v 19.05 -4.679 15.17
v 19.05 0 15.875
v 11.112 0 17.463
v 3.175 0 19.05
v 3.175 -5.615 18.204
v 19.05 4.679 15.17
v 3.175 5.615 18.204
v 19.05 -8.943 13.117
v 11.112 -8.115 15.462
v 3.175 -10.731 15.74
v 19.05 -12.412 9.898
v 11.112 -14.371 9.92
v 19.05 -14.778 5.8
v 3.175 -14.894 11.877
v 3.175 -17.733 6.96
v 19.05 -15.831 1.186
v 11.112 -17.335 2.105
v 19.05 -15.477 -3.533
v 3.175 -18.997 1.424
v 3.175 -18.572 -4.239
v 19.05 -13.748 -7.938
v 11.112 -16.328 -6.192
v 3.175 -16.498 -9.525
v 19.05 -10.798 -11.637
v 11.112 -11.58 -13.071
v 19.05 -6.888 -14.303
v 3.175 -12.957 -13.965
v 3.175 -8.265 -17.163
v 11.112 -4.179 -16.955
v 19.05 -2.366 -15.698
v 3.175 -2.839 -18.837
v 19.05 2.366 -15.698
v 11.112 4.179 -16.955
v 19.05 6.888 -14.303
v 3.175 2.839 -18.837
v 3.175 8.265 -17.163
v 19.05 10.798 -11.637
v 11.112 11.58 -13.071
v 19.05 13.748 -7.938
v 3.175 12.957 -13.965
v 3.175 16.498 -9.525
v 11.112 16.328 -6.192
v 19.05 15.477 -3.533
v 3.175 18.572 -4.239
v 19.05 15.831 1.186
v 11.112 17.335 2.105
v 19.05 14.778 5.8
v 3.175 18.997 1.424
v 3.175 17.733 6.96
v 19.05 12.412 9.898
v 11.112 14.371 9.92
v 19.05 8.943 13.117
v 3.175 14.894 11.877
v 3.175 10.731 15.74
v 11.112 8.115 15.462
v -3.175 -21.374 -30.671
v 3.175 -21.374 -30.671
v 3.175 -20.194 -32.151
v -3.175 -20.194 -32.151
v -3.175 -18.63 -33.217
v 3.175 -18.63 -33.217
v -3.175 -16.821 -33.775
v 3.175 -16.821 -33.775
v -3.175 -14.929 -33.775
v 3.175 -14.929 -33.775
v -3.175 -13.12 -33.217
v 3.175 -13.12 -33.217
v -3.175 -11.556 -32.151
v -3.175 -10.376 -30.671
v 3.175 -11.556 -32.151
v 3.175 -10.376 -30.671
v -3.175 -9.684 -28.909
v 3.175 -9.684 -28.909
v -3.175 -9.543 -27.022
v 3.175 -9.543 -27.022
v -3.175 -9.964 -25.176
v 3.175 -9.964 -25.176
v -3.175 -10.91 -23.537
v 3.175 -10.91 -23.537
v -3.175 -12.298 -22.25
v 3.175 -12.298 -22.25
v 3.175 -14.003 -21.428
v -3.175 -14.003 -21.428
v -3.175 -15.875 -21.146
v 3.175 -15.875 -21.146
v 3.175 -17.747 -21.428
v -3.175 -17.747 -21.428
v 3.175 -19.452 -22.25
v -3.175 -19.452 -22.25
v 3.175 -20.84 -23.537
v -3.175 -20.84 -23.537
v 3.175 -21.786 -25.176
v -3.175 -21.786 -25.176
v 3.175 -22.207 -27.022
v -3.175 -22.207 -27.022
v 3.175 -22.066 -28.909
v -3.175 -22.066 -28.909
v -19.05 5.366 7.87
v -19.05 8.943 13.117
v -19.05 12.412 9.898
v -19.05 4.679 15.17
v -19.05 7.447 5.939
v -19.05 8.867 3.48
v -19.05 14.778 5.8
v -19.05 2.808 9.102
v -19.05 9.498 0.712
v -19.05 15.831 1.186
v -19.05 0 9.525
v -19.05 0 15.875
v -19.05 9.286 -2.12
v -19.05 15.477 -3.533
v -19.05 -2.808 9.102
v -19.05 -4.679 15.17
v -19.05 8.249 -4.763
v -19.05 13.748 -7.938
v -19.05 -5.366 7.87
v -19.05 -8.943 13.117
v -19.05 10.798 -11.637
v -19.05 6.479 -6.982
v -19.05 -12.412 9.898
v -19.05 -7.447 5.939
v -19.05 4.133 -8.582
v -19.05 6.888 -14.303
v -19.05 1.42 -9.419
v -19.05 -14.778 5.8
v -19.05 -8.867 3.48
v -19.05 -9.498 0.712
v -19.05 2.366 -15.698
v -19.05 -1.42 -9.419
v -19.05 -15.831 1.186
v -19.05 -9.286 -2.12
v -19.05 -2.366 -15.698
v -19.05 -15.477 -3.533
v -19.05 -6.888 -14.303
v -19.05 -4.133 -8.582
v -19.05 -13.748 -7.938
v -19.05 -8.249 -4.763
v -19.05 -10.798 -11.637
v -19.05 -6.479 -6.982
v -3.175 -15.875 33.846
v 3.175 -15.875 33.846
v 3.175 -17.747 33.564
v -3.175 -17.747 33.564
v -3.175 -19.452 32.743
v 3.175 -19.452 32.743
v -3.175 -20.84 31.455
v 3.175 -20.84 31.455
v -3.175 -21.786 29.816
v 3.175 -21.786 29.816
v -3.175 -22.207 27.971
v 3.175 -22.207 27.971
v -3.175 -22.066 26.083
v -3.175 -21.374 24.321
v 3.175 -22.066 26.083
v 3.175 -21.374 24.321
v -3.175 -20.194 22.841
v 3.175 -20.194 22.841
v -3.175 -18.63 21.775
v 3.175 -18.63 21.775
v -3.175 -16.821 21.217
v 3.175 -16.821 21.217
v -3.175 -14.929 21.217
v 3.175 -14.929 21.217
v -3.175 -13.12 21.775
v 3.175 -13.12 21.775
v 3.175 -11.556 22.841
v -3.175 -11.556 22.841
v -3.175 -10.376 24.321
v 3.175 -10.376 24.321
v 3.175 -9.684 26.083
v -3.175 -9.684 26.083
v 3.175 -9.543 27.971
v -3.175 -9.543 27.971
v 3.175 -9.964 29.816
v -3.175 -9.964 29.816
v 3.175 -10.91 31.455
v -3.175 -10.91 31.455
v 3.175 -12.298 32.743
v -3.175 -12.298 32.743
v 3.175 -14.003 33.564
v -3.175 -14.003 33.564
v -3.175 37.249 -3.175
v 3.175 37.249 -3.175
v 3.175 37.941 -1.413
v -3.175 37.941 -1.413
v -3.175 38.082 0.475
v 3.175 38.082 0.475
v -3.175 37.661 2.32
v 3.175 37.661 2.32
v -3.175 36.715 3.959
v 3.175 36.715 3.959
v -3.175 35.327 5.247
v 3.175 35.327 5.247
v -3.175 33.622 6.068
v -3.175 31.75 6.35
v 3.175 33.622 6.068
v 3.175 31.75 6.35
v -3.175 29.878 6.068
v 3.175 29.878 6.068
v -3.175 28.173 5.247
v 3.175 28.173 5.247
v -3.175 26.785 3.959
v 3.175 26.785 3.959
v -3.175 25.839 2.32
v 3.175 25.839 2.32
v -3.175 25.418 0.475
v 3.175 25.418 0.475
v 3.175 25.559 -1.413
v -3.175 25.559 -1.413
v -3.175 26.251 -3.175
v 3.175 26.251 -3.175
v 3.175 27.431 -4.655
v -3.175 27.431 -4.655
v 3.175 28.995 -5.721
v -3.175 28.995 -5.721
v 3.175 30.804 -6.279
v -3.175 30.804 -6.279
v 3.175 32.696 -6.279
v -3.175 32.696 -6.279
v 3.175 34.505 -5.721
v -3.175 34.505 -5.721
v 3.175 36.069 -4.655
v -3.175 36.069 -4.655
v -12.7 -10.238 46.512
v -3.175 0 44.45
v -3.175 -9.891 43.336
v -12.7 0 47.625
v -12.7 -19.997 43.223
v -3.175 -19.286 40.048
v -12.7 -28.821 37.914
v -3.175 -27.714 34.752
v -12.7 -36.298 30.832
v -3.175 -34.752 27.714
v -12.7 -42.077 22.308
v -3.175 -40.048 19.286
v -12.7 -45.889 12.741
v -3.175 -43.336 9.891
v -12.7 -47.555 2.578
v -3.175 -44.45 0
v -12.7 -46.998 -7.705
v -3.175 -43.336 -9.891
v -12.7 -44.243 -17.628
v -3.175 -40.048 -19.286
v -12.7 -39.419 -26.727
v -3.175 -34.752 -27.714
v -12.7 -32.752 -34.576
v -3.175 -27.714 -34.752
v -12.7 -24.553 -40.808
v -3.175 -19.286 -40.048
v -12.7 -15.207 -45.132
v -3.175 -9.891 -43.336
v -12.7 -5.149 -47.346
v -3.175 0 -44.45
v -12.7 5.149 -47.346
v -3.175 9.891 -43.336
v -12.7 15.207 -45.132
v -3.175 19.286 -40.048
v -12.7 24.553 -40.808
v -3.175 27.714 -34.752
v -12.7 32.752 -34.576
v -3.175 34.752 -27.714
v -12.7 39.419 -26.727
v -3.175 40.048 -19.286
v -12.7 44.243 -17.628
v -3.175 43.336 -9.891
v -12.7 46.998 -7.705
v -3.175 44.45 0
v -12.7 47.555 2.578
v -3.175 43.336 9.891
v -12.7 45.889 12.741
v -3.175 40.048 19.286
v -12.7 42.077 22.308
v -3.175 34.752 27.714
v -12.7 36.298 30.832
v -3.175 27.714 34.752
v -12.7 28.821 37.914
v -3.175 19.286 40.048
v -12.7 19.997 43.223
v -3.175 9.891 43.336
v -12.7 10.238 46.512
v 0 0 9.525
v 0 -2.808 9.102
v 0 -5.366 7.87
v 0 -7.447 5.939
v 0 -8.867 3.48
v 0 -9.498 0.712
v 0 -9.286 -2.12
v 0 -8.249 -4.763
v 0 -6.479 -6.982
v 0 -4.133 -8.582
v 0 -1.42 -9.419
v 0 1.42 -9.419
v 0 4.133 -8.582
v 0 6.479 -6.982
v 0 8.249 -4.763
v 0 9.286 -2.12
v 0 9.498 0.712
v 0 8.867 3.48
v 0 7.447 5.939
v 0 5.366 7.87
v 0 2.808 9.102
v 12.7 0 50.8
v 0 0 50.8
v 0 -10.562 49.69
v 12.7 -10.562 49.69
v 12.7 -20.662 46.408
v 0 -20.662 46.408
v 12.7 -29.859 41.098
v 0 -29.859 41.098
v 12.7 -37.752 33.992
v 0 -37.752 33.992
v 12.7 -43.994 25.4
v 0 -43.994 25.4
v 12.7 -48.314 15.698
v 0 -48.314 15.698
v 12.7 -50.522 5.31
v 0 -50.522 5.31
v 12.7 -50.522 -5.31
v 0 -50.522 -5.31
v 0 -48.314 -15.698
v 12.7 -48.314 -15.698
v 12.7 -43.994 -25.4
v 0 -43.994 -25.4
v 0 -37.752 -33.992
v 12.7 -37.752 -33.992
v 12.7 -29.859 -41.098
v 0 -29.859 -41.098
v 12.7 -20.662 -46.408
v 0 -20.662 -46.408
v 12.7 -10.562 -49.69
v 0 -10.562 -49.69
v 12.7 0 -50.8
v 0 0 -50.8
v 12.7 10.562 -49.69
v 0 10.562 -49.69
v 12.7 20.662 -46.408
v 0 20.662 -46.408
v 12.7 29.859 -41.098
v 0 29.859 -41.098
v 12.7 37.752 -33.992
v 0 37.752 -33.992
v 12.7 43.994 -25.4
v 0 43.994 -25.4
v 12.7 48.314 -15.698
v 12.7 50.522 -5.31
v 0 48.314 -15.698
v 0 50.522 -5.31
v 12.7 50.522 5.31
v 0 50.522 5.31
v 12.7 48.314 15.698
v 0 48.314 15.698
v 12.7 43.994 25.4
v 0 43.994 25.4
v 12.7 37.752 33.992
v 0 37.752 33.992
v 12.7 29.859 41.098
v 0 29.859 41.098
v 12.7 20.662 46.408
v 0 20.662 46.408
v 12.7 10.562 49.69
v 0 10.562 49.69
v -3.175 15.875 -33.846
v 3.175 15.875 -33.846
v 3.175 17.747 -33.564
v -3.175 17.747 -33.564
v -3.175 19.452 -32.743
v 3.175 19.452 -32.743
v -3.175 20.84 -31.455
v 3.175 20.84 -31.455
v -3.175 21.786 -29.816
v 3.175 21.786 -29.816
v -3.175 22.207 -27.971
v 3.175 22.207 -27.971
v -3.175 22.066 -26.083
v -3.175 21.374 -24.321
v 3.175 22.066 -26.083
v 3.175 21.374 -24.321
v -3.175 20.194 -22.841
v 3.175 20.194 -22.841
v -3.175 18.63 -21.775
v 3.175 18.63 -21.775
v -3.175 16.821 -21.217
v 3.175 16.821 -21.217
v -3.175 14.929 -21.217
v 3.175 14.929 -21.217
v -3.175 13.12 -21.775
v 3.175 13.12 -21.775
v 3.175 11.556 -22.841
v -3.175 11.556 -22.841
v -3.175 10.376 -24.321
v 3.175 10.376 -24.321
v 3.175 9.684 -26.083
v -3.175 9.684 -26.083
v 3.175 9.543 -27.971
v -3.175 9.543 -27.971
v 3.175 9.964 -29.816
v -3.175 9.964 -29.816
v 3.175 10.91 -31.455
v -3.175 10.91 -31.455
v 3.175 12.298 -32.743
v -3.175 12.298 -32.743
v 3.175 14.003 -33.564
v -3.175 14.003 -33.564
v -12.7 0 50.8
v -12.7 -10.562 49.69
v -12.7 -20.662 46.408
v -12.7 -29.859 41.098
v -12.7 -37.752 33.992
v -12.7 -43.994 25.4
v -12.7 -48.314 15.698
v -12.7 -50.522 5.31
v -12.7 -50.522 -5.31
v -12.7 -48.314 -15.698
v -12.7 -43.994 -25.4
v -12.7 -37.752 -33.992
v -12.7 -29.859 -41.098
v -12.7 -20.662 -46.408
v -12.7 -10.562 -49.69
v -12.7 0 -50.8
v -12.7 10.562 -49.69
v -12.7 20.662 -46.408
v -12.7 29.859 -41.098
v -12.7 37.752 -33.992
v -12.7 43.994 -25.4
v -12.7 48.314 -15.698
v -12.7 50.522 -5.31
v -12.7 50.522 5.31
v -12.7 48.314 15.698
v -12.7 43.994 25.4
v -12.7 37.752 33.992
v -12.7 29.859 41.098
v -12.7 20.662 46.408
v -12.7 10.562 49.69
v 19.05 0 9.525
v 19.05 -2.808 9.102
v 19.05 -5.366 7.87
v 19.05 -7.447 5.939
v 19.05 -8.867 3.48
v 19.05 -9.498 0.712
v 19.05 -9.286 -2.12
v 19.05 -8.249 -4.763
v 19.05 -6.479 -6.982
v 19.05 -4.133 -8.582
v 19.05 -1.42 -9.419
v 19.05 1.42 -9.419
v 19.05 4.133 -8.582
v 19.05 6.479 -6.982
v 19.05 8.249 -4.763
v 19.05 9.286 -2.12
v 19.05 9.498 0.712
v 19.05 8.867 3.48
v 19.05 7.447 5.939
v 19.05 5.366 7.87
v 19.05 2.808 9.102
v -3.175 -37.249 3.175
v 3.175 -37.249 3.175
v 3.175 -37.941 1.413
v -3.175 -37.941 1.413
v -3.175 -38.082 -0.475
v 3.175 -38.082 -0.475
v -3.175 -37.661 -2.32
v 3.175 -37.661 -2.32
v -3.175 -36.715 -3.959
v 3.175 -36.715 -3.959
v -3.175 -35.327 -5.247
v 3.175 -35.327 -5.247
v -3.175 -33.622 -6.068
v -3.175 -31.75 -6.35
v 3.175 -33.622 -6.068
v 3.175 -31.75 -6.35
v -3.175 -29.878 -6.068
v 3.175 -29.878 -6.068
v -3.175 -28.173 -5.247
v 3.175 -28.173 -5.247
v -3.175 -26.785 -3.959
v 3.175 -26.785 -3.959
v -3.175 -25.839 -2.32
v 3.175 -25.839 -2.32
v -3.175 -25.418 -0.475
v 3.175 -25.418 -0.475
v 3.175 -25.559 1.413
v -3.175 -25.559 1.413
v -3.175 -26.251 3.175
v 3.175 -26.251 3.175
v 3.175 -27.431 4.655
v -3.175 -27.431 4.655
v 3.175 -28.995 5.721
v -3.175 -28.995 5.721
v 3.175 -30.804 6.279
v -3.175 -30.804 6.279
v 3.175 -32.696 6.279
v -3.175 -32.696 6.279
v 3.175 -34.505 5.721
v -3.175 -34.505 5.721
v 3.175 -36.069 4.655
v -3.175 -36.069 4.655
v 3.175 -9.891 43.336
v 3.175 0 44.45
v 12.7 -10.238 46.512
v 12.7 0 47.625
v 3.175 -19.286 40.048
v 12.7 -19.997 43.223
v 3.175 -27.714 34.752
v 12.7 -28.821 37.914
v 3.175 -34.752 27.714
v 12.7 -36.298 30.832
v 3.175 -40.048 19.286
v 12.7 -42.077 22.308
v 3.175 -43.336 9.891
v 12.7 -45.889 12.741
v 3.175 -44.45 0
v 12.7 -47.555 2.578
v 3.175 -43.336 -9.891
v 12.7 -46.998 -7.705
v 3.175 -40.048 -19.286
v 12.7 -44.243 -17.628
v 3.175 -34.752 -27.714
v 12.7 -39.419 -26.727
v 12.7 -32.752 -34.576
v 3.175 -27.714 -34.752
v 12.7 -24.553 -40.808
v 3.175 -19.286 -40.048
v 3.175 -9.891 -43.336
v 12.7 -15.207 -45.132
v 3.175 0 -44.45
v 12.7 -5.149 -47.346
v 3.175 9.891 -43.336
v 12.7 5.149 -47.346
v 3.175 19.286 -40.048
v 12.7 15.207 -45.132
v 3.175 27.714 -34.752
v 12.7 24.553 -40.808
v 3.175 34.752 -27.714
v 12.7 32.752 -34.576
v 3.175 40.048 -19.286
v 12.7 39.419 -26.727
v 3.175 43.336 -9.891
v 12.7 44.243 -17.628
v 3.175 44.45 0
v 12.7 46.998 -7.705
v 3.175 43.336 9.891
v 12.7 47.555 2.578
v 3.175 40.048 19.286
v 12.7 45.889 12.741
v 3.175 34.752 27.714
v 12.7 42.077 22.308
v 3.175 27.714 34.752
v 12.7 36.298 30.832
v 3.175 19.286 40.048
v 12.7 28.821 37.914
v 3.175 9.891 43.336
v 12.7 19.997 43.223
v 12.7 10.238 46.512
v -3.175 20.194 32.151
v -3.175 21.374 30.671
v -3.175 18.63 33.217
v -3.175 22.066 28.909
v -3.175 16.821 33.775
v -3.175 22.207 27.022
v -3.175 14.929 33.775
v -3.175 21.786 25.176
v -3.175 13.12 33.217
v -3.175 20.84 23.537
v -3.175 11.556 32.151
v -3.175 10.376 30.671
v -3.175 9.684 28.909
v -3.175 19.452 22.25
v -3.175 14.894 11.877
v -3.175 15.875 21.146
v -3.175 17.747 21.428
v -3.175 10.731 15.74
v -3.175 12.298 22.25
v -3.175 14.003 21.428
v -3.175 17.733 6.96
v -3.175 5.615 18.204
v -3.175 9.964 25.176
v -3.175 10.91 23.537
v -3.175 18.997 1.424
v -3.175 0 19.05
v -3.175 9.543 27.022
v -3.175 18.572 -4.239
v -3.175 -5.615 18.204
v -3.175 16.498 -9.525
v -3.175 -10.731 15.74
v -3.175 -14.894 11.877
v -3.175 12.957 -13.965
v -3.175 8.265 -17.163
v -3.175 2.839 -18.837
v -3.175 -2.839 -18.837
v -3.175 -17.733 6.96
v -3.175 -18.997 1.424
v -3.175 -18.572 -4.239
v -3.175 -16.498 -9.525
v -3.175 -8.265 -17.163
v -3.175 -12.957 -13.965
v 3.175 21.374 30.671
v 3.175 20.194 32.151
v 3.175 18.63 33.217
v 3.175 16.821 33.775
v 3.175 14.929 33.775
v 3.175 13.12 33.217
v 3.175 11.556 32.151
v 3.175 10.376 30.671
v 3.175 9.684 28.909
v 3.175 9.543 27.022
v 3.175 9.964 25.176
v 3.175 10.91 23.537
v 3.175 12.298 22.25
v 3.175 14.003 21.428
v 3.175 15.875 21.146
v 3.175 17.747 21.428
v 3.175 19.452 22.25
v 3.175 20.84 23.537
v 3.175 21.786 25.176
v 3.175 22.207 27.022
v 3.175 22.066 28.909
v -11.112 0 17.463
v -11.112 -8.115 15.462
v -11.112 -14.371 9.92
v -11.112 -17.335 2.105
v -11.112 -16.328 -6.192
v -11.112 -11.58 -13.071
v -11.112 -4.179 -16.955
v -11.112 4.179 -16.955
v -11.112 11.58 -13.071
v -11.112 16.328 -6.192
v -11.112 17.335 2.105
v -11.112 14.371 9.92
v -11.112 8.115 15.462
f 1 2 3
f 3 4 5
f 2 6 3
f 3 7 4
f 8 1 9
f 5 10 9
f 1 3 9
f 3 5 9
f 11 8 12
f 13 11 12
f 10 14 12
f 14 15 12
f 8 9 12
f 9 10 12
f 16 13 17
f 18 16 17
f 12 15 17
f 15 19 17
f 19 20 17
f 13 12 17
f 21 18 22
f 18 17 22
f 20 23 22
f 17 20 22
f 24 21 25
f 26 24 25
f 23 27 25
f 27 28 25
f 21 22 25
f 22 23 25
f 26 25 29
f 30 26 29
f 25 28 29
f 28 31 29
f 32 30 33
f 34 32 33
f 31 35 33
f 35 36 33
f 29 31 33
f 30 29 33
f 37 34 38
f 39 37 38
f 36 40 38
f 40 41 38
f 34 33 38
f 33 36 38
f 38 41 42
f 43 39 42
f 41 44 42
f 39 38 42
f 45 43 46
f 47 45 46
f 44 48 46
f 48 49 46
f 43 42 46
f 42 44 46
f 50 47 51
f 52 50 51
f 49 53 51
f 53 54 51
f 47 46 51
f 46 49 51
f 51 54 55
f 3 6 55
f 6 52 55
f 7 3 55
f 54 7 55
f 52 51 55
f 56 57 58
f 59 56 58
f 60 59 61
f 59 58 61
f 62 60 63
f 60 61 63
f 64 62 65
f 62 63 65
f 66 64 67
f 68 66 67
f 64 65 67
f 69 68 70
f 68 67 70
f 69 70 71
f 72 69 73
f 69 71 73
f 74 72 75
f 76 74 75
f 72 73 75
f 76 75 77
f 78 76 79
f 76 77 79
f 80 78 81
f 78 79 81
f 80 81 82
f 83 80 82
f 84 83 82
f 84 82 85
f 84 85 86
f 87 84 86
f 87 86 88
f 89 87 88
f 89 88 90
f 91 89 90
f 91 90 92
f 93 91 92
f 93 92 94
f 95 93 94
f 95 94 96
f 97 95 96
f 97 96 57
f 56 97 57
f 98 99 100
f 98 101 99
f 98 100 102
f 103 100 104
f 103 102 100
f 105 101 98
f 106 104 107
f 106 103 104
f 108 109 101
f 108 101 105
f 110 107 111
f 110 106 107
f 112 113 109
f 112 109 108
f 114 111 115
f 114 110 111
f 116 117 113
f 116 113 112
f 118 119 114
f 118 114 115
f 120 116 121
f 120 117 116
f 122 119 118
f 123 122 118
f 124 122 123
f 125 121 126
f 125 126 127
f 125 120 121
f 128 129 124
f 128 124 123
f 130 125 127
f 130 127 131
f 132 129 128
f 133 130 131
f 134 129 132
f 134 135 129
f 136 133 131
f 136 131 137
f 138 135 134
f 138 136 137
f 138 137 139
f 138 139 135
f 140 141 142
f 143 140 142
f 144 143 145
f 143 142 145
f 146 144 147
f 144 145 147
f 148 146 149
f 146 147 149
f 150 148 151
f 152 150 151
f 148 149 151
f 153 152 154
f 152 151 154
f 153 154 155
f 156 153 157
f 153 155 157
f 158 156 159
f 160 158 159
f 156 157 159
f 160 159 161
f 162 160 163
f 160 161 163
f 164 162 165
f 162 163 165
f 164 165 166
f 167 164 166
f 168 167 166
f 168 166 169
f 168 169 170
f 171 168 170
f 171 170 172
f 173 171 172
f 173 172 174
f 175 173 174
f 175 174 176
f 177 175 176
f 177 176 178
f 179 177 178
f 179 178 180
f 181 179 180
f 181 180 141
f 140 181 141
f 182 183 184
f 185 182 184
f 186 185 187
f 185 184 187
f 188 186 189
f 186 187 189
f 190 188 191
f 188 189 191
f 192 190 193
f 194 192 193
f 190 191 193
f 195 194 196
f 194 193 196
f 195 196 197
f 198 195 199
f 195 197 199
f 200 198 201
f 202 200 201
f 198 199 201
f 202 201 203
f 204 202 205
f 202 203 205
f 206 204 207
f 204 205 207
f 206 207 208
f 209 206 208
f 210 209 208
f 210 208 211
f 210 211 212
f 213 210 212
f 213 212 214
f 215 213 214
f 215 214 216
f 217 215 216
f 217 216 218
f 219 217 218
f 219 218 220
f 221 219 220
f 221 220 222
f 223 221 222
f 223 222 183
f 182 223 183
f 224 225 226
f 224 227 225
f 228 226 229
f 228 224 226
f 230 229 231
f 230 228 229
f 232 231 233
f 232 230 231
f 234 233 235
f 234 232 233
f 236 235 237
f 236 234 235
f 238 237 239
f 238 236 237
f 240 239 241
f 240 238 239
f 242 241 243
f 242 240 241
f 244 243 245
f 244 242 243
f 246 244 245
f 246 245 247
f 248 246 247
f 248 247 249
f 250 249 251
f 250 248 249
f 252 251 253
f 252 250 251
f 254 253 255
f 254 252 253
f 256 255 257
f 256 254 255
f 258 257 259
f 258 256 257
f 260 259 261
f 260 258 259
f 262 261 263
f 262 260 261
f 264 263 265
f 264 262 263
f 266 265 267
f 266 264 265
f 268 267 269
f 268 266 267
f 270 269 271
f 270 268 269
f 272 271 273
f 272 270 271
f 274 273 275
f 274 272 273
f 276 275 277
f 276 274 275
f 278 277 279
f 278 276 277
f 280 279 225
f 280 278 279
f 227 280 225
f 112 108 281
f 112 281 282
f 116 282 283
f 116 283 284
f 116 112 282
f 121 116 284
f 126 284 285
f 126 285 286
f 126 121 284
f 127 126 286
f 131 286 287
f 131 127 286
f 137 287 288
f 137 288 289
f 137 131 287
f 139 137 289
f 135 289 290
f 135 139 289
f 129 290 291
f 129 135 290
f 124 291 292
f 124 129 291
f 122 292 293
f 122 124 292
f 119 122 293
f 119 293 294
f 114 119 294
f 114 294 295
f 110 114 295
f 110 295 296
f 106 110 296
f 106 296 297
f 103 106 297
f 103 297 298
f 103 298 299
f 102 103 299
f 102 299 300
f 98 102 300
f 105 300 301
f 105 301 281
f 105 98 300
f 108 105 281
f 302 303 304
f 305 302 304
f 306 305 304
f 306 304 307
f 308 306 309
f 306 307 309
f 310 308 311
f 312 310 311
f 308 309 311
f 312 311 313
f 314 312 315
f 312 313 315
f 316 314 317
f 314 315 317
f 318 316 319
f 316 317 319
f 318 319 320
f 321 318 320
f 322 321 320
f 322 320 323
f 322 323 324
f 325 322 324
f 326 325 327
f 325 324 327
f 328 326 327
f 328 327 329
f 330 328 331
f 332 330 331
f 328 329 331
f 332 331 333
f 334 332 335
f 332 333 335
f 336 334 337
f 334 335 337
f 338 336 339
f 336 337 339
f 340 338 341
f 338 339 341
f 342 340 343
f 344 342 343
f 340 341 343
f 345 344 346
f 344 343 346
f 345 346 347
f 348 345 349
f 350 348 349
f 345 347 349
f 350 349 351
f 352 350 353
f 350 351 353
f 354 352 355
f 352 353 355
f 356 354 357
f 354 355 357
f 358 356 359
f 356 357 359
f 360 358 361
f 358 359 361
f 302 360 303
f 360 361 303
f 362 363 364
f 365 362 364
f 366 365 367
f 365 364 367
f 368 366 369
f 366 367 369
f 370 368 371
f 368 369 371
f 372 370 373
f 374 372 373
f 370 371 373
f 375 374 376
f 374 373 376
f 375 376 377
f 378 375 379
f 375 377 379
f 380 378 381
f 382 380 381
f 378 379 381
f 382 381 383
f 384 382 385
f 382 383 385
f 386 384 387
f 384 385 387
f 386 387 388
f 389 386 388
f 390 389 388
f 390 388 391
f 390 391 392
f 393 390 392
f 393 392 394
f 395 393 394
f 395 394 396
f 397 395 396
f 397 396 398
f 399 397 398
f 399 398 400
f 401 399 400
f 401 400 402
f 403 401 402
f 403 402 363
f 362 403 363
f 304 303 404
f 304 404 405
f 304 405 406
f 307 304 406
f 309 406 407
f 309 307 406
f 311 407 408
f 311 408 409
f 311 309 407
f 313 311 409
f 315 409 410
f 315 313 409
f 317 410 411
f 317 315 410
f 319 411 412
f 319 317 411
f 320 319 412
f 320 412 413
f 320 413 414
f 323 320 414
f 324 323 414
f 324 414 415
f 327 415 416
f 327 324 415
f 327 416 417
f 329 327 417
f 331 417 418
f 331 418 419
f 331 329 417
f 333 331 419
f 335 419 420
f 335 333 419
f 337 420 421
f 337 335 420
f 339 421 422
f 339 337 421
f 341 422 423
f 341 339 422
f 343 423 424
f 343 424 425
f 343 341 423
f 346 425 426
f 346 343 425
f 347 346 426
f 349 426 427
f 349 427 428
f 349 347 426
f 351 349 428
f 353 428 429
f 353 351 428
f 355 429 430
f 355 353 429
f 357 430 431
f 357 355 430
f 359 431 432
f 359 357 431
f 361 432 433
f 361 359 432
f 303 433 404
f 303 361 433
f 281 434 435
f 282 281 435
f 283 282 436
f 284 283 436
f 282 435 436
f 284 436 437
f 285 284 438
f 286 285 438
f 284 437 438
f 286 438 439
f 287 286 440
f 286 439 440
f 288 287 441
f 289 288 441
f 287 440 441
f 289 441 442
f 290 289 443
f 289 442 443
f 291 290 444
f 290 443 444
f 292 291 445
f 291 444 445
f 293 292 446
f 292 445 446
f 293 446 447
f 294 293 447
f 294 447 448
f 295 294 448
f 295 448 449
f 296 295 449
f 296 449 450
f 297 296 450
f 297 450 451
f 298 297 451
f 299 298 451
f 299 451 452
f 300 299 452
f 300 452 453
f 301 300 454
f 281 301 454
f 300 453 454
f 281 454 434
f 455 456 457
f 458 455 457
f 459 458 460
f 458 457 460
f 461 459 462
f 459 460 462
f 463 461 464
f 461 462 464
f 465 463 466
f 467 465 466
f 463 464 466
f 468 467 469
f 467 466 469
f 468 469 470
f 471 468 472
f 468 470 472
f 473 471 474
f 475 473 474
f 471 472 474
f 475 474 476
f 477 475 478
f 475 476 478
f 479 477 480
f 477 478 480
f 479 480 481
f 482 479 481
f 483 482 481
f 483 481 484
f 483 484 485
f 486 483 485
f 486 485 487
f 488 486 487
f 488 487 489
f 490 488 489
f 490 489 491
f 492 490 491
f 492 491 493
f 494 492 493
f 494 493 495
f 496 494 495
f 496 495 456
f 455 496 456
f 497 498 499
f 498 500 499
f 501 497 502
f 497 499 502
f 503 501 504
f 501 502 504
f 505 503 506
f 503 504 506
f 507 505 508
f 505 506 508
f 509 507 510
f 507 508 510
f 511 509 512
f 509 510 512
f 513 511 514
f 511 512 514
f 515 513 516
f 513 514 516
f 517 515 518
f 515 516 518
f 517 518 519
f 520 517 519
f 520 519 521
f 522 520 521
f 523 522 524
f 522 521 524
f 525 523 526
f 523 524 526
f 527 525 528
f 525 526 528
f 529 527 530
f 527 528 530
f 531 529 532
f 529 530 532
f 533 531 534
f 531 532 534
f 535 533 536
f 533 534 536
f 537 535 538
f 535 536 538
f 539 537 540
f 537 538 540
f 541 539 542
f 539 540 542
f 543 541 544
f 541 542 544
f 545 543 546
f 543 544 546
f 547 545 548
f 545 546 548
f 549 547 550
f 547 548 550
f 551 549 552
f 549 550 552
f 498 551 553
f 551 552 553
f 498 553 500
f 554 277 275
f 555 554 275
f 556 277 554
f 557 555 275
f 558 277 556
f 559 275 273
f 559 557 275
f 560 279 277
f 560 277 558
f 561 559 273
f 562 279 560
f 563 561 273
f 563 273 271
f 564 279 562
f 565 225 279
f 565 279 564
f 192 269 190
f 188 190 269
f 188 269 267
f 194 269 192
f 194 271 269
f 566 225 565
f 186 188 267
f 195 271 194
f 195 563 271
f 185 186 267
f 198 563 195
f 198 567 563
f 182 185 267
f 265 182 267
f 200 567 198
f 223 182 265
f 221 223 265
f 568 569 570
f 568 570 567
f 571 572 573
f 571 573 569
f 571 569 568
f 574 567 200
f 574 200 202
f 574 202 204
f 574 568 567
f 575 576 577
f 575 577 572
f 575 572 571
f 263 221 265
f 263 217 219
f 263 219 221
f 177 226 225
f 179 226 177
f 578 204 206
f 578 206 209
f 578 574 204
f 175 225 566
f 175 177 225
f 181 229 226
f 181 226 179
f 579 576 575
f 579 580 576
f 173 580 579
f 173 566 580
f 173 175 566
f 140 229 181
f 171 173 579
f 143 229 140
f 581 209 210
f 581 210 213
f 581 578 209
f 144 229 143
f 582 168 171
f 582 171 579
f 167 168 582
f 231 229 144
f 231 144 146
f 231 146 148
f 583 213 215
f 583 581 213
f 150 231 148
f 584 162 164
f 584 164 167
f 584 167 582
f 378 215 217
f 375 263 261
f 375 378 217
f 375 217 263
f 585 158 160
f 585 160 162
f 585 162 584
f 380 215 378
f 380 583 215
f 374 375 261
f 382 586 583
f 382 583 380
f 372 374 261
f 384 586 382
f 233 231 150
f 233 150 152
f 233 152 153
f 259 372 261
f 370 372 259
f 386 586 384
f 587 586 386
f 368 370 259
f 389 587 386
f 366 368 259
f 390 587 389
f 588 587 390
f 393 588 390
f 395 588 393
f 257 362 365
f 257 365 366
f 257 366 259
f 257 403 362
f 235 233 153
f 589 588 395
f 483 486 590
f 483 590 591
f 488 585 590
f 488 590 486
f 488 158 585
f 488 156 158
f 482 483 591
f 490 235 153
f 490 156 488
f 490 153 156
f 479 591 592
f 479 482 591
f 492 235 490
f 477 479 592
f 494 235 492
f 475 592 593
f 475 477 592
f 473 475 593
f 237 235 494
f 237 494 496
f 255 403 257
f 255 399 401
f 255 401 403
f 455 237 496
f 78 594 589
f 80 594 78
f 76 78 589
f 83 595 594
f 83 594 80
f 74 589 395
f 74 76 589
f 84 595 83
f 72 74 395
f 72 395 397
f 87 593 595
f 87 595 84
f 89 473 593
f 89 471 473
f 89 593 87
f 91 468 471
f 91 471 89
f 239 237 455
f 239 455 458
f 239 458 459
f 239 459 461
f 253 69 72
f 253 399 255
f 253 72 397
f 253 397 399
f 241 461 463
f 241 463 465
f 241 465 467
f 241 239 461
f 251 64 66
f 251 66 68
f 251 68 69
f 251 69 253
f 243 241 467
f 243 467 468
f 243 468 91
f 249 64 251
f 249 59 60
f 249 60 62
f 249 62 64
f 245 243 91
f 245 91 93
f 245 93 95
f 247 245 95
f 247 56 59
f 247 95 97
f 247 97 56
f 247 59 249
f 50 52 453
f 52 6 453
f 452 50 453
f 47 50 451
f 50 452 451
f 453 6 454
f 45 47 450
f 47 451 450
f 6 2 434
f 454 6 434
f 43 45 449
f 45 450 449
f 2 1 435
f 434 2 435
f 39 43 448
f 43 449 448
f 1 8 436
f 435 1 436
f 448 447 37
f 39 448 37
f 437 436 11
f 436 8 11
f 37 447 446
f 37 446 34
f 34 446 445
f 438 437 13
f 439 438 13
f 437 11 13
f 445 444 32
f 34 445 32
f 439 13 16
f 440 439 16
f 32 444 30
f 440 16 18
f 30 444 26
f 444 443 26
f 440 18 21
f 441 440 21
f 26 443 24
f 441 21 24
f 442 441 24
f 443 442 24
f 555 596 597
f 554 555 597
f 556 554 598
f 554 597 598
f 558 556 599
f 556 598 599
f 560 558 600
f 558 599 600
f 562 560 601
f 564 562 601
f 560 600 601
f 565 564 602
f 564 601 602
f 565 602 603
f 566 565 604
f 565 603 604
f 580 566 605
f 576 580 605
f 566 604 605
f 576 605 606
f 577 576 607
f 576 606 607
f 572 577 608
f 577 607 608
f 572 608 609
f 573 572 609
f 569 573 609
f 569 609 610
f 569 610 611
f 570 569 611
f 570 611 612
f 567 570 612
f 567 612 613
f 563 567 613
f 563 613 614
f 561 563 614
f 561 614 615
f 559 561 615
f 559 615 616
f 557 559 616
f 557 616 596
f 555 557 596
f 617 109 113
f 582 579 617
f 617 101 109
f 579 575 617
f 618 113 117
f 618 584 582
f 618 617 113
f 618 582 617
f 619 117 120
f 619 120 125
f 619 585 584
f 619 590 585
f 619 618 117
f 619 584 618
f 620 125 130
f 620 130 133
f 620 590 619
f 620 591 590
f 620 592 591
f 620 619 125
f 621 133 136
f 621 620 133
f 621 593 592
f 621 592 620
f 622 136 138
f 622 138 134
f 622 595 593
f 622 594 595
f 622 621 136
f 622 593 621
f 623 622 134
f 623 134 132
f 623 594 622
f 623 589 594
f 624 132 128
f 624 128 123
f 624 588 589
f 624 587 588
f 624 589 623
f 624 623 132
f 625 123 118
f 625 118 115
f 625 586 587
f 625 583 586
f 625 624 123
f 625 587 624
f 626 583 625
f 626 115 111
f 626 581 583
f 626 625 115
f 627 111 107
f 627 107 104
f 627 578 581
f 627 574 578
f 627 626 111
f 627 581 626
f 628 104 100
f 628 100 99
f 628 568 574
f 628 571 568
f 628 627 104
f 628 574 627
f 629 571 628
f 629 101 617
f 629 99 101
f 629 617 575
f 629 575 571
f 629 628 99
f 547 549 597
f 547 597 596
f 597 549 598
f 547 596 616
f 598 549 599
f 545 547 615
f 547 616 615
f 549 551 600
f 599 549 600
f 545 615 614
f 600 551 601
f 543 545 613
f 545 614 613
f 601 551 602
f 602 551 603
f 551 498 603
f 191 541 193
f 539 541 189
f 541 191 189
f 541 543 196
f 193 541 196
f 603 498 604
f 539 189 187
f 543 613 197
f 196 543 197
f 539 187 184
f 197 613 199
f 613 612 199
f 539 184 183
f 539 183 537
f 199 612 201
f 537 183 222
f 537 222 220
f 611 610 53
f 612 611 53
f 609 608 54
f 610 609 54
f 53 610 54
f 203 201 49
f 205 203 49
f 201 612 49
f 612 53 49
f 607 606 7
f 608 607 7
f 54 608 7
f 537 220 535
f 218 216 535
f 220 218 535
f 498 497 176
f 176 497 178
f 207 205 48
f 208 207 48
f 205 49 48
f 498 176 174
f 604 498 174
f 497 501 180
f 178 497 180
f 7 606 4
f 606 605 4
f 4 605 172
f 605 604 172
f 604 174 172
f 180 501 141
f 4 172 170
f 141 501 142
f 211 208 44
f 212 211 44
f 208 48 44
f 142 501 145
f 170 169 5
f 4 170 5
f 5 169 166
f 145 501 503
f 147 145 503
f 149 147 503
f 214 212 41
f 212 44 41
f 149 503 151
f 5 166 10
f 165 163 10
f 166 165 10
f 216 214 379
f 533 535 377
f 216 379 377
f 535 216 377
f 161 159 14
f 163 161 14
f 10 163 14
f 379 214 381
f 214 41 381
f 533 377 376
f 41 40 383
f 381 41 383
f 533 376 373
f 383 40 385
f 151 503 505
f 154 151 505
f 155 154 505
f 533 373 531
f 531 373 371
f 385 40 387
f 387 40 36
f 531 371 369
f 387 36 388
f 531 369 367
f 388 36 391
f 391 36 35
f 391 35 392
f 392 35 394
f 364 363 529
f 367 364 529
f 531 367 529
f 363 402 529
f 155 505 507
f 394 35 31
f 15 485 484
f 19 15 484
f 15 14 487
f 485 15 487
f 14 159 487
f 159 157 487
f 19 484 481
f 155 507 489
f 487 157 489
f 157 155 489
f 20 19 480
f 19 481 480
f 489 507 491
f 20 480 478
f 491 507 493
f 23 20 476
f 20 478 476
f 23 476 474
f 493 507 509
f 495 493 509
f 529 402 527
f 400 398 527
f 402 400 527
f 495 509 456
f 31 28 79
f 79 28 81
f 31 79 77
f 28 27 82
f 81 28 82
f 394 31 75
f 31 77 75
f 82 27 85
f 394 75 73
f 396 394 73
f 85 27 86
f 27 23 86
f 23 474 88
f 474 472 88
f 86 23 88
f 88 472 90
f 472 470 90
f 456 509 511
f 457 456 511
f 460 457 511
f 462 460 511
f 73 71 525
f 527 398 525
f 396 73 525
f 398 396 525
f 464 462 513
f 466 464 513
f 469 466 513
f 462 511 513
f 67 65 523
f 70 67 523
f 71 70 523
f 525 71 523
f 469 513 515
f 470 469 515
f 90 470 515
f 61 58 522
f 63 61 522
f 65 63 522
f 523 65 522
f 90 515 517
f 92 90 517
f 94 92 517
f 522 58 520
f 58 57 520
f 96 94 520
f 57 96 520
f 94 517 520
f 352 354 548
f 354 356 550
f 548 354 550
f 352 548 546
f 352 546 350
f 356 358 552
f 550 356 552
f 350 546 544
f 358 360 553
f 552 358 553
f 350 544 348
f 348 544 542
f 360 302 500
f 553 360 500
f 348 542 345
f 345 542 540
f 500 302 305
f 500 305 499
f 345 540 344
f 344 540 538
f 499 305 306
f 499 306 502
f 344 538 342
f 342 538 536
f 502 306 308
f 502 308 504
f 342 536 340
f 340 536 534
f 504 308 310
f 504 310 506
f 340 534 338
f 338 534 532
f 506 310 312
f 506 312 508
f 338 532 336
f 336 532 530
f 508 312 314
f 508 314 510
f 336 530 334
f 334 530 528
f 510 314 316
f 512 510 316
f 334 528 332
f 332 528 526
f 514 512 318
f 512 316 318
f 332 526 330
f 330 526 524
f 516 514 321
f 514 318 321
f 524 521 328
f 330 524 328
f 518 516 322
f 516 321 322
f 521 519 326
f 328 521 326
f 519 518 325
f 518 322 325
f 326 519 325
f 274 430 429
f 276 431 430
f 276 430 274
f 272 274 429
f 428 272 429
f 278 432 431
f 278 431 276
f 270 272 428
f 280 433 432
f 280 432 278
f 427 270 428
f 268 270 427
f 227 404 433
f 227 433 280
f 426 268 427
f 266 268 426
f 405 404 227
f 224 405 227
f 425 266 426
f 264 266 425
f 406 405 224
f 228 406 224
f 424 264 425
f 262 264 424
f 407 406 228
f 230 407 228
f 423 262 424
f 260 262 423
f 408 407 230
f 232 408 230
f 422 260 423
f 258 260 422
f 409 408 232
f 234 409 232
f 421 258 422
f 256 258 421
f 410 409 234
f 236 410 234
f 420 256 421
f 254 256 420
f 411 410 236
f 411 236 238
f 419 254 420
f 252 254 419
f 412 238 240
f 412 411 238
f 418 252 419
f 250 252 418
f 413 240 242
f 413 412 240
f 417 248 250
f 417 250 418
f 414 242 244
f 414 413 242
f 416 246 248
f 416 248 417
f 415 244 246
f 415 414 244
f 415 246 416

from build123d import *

# Parameters (mm, degrees)
SKETCH2_R          = 6.35
CUT_EXTRUDE1_DEPTH = 76.201267443
CIRPATTERN1_COUNT  = 6


with BuildPart() as part:
    # Sketch1 → Revolve1 (revolve)
    with BuildSketch(Plane.XY, mode=Mode.PRIVATE) as revolve1_sk:
        Polygon((0, 50.8), (0, 9.525), (19.05, 9.525), (19.05, 15.875), (3.175, 19.05), (3.175, 44.45), (12.7, 47.625), (12.7, 50.8), align=None)
    revolve1 = revolve(revolve1_sk.sketch.rotate(Axis((0, 0, 0), (1, 0, 0)), 90), axis=Axis((0, 0, 0), (1, 0, 0)))

    # Mirror1: Revolve1 across plane
    add(revolve1.mirror(Plane(origin=(0, 50.8, 0), x_dir=(0, 0, 1), z_dir=(1, 0, 0))))

    # Sketch2 → Cut-Extrude1 (cut, through all)
    with BuildSketch(Plane(origin=(3.175, 0, 0), x_dir=(0, 0, -1), z_dir=(1, 0, 0))):
        with Locations((27.49630657, 15.875)):
            Circle(SKETCH2_R)
    cut_extrude1 = extrude(amount=-CUT_EXTRUDE1_DEPTH, mode=Mode.SUBTRACT)

    # CirPattern1: Cut-Extrude1 ×6 about axis
    cirpattern1_axis = Axis((0, 0, 0), (1, 0, 0))
    for i in range(1, CIRPATTERN1_COUNT):
        add(cut_extrude1.rotate(cirpattern1_axis, i * 360 / CIRPATTERN1_COUNT), mode=Mode.SUBTRACT)


solid = part.part
